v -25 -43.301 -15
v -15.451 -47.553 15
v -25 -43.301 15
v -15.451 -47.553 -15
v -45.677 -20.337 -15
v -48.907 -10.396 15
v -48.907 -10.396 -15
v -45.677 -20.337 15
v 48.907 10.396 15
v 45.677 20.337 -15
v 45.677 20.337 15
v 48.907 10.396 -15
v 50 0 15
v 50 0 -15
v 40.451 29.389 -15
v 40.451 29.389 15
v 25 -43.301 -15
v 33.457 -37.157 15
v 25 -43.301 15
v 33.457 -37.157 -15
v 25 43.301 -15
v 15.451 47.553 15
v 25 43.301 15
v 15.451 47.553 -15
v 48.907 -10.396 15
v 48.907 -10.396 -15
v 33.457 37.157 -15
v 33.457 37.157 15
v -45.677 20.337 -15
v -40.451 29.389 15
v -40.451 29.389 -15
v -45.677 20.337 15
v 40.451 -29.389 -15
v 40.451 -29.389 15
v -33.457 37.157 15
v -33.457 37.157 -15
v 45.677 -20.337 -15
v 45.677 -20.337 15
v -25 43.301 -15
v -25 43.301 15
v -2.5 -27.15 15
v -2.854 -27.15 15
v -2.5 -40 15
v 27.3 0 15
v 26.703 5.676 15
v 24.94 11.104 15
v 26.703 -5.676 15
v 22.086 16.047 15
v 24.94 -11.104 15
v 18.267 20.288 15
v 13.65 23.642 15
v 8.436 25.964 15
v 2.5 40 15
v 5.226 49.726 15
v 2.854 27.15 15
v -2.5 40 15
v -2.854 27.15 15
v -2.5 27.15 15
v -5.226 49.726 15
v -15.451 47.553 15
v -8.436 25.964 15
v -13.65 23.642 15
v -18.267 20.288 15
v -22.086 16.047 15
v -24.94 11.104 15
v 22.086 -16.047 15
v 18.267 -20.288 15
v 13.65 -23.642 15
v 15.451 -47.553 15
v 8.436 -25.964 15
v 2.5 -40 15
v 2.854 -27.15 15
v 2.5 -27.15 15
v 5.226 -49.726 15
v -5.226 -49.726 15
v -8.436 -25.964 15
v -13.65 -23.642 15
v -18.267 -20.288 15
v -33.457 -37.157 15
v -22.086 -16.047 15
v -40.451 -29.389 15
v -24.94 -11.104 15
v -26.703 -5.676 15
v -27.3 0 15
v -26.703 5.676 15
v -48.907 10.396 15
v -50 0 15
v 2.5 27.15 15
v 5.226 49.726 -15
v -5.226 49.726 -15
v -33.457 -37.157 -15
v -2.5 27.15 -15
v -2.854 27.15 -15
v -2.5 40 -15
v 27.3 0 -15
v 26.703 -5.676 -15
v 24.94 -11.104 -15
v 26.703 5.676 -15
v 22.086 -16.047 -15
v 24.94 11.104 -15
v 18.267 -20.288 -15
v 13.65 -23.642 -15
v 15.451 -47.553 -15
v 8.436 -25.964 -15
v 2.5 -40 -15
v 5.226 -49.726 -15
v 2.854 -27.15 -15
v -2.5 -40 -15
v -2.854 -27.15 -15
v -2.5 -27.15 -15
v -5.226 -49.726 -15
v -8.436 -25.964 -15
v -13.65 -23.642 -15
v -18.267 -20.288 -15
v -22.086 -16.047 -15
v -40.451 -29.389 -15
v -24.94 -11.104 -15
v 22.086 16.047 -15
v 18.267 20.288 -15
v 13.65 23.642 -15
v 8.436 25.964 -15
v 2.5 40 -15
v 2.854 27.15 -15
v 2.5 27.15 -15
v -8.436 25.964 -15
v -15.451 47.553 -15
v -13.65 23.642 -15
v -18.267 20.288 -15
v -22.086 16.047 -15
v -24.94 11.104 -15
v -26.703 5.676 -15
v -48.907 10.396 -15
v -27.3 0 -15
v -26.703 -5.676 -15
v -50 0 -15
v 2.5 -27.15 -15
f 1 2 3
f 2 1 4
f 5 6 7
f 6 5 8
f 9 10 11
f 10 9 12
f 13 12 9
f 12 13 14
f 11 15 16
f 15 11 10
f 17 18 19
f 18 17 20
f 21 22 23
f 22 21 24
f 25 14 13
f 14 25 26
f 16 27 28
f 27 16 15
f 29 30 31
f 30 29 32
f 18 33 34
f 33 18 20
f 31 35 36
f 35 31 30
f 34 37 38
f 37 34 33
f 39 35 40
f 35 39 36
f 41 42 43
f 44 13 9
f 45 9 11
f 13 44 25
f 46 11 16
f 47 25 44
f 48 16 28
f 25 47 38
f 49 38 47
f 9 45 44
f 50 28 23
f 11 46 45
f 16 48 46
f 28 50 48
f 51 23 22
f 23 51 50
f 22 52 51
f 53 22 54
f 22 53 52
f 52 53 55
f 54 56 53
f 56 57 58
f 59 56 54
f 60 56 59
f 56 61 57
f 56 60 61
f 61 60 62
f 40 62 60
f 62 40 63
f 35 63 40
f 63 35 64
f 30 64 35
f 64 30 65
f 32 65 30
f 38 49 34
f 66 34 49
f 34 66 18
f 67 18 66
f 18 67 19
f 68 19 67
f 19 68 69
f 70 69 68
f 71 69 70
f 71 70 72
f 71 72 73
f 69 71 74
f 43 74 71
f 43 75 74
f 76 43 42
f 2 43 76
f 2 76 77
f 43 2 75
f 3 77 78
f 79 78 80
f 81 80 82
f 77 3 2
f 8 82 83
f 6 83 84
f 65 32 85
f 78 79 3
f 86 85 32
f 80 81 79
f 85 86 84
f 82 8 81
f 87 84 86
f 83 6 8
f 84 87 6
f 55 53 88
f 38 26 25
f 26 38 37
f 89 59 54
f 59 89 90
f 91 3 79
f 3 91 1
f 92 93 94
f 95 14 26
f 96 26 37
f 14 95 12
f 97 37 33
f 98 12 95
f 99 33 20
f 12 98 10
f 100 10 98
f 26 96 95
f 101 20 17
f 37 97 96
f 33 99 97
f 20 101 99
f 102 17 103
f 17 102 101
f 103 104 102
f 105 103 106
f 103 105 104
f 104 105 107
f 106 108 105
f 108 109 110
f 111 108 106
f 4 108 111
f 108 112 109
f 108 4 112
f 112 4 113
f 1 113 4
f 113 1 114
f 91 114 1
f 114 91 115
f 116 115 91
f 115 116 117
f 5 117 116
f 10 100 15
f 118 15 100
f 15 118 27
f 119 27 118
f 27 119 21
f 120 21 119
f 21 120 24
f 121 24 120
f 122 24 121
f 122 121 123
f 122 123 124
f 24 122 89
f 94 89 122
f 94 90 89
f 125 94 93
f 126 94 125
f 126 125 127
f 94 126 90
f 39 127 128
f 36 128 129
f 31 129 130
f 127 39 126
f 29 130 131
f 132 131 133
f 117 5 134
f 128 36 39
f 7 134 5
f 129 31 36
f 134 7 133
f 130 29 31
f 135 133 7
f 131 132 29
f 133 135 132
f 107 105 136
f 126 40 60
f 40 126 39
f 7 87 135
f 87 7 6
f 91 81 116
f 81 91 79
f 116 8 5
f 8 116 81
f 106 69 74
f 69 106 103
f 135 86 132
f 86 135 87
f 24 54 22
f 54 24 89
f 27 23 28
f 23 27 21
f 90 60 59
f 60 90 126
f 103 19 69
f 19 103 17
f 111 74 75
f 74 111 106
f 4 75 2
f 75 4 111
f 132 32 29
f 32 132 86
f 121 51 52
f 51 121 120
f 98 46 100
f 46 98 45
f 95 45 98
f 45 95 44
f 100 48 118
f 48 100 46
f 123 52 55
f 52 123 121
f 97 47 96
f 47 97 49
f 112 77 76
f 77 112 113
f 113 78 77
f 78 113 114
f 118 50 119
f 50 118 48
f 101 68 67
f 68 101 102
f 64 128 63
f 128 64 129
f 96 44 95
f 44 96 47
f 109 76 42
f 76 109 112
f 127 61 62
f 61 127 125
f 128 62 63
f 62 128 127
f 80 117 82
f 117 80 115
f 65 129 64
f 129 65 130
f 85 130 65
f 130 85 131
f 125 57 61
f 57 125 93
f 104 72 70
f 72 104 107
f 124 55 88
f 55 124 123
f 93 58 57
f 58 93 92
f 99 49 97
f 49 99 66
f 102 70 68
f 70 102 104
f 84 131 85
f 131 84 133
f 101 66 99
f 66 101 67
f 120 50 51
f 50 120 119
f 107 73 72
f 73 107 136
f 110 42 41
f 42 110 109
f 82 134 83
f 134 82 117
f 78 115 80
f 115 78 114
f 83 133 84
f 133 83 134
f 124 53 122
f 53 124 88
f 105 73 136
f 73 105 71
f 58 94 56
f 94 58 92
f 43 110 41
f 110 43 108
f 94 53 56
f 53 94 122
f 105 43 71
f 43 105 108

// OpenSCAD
difference() {
    // resize([150], auto = true) import("temp.stl");
    // translate([-63, 0, 0]) cube(70, center = true);
    // translate([63, 0, 0]) cube(70, center = true);
    difference() {
        cylinder(r = 50, h = 30, center = true);
        cylinder(r = 27.3, h = 30, center = true);
        cube(size = [5, 80, 30], center = true);
    }
}
